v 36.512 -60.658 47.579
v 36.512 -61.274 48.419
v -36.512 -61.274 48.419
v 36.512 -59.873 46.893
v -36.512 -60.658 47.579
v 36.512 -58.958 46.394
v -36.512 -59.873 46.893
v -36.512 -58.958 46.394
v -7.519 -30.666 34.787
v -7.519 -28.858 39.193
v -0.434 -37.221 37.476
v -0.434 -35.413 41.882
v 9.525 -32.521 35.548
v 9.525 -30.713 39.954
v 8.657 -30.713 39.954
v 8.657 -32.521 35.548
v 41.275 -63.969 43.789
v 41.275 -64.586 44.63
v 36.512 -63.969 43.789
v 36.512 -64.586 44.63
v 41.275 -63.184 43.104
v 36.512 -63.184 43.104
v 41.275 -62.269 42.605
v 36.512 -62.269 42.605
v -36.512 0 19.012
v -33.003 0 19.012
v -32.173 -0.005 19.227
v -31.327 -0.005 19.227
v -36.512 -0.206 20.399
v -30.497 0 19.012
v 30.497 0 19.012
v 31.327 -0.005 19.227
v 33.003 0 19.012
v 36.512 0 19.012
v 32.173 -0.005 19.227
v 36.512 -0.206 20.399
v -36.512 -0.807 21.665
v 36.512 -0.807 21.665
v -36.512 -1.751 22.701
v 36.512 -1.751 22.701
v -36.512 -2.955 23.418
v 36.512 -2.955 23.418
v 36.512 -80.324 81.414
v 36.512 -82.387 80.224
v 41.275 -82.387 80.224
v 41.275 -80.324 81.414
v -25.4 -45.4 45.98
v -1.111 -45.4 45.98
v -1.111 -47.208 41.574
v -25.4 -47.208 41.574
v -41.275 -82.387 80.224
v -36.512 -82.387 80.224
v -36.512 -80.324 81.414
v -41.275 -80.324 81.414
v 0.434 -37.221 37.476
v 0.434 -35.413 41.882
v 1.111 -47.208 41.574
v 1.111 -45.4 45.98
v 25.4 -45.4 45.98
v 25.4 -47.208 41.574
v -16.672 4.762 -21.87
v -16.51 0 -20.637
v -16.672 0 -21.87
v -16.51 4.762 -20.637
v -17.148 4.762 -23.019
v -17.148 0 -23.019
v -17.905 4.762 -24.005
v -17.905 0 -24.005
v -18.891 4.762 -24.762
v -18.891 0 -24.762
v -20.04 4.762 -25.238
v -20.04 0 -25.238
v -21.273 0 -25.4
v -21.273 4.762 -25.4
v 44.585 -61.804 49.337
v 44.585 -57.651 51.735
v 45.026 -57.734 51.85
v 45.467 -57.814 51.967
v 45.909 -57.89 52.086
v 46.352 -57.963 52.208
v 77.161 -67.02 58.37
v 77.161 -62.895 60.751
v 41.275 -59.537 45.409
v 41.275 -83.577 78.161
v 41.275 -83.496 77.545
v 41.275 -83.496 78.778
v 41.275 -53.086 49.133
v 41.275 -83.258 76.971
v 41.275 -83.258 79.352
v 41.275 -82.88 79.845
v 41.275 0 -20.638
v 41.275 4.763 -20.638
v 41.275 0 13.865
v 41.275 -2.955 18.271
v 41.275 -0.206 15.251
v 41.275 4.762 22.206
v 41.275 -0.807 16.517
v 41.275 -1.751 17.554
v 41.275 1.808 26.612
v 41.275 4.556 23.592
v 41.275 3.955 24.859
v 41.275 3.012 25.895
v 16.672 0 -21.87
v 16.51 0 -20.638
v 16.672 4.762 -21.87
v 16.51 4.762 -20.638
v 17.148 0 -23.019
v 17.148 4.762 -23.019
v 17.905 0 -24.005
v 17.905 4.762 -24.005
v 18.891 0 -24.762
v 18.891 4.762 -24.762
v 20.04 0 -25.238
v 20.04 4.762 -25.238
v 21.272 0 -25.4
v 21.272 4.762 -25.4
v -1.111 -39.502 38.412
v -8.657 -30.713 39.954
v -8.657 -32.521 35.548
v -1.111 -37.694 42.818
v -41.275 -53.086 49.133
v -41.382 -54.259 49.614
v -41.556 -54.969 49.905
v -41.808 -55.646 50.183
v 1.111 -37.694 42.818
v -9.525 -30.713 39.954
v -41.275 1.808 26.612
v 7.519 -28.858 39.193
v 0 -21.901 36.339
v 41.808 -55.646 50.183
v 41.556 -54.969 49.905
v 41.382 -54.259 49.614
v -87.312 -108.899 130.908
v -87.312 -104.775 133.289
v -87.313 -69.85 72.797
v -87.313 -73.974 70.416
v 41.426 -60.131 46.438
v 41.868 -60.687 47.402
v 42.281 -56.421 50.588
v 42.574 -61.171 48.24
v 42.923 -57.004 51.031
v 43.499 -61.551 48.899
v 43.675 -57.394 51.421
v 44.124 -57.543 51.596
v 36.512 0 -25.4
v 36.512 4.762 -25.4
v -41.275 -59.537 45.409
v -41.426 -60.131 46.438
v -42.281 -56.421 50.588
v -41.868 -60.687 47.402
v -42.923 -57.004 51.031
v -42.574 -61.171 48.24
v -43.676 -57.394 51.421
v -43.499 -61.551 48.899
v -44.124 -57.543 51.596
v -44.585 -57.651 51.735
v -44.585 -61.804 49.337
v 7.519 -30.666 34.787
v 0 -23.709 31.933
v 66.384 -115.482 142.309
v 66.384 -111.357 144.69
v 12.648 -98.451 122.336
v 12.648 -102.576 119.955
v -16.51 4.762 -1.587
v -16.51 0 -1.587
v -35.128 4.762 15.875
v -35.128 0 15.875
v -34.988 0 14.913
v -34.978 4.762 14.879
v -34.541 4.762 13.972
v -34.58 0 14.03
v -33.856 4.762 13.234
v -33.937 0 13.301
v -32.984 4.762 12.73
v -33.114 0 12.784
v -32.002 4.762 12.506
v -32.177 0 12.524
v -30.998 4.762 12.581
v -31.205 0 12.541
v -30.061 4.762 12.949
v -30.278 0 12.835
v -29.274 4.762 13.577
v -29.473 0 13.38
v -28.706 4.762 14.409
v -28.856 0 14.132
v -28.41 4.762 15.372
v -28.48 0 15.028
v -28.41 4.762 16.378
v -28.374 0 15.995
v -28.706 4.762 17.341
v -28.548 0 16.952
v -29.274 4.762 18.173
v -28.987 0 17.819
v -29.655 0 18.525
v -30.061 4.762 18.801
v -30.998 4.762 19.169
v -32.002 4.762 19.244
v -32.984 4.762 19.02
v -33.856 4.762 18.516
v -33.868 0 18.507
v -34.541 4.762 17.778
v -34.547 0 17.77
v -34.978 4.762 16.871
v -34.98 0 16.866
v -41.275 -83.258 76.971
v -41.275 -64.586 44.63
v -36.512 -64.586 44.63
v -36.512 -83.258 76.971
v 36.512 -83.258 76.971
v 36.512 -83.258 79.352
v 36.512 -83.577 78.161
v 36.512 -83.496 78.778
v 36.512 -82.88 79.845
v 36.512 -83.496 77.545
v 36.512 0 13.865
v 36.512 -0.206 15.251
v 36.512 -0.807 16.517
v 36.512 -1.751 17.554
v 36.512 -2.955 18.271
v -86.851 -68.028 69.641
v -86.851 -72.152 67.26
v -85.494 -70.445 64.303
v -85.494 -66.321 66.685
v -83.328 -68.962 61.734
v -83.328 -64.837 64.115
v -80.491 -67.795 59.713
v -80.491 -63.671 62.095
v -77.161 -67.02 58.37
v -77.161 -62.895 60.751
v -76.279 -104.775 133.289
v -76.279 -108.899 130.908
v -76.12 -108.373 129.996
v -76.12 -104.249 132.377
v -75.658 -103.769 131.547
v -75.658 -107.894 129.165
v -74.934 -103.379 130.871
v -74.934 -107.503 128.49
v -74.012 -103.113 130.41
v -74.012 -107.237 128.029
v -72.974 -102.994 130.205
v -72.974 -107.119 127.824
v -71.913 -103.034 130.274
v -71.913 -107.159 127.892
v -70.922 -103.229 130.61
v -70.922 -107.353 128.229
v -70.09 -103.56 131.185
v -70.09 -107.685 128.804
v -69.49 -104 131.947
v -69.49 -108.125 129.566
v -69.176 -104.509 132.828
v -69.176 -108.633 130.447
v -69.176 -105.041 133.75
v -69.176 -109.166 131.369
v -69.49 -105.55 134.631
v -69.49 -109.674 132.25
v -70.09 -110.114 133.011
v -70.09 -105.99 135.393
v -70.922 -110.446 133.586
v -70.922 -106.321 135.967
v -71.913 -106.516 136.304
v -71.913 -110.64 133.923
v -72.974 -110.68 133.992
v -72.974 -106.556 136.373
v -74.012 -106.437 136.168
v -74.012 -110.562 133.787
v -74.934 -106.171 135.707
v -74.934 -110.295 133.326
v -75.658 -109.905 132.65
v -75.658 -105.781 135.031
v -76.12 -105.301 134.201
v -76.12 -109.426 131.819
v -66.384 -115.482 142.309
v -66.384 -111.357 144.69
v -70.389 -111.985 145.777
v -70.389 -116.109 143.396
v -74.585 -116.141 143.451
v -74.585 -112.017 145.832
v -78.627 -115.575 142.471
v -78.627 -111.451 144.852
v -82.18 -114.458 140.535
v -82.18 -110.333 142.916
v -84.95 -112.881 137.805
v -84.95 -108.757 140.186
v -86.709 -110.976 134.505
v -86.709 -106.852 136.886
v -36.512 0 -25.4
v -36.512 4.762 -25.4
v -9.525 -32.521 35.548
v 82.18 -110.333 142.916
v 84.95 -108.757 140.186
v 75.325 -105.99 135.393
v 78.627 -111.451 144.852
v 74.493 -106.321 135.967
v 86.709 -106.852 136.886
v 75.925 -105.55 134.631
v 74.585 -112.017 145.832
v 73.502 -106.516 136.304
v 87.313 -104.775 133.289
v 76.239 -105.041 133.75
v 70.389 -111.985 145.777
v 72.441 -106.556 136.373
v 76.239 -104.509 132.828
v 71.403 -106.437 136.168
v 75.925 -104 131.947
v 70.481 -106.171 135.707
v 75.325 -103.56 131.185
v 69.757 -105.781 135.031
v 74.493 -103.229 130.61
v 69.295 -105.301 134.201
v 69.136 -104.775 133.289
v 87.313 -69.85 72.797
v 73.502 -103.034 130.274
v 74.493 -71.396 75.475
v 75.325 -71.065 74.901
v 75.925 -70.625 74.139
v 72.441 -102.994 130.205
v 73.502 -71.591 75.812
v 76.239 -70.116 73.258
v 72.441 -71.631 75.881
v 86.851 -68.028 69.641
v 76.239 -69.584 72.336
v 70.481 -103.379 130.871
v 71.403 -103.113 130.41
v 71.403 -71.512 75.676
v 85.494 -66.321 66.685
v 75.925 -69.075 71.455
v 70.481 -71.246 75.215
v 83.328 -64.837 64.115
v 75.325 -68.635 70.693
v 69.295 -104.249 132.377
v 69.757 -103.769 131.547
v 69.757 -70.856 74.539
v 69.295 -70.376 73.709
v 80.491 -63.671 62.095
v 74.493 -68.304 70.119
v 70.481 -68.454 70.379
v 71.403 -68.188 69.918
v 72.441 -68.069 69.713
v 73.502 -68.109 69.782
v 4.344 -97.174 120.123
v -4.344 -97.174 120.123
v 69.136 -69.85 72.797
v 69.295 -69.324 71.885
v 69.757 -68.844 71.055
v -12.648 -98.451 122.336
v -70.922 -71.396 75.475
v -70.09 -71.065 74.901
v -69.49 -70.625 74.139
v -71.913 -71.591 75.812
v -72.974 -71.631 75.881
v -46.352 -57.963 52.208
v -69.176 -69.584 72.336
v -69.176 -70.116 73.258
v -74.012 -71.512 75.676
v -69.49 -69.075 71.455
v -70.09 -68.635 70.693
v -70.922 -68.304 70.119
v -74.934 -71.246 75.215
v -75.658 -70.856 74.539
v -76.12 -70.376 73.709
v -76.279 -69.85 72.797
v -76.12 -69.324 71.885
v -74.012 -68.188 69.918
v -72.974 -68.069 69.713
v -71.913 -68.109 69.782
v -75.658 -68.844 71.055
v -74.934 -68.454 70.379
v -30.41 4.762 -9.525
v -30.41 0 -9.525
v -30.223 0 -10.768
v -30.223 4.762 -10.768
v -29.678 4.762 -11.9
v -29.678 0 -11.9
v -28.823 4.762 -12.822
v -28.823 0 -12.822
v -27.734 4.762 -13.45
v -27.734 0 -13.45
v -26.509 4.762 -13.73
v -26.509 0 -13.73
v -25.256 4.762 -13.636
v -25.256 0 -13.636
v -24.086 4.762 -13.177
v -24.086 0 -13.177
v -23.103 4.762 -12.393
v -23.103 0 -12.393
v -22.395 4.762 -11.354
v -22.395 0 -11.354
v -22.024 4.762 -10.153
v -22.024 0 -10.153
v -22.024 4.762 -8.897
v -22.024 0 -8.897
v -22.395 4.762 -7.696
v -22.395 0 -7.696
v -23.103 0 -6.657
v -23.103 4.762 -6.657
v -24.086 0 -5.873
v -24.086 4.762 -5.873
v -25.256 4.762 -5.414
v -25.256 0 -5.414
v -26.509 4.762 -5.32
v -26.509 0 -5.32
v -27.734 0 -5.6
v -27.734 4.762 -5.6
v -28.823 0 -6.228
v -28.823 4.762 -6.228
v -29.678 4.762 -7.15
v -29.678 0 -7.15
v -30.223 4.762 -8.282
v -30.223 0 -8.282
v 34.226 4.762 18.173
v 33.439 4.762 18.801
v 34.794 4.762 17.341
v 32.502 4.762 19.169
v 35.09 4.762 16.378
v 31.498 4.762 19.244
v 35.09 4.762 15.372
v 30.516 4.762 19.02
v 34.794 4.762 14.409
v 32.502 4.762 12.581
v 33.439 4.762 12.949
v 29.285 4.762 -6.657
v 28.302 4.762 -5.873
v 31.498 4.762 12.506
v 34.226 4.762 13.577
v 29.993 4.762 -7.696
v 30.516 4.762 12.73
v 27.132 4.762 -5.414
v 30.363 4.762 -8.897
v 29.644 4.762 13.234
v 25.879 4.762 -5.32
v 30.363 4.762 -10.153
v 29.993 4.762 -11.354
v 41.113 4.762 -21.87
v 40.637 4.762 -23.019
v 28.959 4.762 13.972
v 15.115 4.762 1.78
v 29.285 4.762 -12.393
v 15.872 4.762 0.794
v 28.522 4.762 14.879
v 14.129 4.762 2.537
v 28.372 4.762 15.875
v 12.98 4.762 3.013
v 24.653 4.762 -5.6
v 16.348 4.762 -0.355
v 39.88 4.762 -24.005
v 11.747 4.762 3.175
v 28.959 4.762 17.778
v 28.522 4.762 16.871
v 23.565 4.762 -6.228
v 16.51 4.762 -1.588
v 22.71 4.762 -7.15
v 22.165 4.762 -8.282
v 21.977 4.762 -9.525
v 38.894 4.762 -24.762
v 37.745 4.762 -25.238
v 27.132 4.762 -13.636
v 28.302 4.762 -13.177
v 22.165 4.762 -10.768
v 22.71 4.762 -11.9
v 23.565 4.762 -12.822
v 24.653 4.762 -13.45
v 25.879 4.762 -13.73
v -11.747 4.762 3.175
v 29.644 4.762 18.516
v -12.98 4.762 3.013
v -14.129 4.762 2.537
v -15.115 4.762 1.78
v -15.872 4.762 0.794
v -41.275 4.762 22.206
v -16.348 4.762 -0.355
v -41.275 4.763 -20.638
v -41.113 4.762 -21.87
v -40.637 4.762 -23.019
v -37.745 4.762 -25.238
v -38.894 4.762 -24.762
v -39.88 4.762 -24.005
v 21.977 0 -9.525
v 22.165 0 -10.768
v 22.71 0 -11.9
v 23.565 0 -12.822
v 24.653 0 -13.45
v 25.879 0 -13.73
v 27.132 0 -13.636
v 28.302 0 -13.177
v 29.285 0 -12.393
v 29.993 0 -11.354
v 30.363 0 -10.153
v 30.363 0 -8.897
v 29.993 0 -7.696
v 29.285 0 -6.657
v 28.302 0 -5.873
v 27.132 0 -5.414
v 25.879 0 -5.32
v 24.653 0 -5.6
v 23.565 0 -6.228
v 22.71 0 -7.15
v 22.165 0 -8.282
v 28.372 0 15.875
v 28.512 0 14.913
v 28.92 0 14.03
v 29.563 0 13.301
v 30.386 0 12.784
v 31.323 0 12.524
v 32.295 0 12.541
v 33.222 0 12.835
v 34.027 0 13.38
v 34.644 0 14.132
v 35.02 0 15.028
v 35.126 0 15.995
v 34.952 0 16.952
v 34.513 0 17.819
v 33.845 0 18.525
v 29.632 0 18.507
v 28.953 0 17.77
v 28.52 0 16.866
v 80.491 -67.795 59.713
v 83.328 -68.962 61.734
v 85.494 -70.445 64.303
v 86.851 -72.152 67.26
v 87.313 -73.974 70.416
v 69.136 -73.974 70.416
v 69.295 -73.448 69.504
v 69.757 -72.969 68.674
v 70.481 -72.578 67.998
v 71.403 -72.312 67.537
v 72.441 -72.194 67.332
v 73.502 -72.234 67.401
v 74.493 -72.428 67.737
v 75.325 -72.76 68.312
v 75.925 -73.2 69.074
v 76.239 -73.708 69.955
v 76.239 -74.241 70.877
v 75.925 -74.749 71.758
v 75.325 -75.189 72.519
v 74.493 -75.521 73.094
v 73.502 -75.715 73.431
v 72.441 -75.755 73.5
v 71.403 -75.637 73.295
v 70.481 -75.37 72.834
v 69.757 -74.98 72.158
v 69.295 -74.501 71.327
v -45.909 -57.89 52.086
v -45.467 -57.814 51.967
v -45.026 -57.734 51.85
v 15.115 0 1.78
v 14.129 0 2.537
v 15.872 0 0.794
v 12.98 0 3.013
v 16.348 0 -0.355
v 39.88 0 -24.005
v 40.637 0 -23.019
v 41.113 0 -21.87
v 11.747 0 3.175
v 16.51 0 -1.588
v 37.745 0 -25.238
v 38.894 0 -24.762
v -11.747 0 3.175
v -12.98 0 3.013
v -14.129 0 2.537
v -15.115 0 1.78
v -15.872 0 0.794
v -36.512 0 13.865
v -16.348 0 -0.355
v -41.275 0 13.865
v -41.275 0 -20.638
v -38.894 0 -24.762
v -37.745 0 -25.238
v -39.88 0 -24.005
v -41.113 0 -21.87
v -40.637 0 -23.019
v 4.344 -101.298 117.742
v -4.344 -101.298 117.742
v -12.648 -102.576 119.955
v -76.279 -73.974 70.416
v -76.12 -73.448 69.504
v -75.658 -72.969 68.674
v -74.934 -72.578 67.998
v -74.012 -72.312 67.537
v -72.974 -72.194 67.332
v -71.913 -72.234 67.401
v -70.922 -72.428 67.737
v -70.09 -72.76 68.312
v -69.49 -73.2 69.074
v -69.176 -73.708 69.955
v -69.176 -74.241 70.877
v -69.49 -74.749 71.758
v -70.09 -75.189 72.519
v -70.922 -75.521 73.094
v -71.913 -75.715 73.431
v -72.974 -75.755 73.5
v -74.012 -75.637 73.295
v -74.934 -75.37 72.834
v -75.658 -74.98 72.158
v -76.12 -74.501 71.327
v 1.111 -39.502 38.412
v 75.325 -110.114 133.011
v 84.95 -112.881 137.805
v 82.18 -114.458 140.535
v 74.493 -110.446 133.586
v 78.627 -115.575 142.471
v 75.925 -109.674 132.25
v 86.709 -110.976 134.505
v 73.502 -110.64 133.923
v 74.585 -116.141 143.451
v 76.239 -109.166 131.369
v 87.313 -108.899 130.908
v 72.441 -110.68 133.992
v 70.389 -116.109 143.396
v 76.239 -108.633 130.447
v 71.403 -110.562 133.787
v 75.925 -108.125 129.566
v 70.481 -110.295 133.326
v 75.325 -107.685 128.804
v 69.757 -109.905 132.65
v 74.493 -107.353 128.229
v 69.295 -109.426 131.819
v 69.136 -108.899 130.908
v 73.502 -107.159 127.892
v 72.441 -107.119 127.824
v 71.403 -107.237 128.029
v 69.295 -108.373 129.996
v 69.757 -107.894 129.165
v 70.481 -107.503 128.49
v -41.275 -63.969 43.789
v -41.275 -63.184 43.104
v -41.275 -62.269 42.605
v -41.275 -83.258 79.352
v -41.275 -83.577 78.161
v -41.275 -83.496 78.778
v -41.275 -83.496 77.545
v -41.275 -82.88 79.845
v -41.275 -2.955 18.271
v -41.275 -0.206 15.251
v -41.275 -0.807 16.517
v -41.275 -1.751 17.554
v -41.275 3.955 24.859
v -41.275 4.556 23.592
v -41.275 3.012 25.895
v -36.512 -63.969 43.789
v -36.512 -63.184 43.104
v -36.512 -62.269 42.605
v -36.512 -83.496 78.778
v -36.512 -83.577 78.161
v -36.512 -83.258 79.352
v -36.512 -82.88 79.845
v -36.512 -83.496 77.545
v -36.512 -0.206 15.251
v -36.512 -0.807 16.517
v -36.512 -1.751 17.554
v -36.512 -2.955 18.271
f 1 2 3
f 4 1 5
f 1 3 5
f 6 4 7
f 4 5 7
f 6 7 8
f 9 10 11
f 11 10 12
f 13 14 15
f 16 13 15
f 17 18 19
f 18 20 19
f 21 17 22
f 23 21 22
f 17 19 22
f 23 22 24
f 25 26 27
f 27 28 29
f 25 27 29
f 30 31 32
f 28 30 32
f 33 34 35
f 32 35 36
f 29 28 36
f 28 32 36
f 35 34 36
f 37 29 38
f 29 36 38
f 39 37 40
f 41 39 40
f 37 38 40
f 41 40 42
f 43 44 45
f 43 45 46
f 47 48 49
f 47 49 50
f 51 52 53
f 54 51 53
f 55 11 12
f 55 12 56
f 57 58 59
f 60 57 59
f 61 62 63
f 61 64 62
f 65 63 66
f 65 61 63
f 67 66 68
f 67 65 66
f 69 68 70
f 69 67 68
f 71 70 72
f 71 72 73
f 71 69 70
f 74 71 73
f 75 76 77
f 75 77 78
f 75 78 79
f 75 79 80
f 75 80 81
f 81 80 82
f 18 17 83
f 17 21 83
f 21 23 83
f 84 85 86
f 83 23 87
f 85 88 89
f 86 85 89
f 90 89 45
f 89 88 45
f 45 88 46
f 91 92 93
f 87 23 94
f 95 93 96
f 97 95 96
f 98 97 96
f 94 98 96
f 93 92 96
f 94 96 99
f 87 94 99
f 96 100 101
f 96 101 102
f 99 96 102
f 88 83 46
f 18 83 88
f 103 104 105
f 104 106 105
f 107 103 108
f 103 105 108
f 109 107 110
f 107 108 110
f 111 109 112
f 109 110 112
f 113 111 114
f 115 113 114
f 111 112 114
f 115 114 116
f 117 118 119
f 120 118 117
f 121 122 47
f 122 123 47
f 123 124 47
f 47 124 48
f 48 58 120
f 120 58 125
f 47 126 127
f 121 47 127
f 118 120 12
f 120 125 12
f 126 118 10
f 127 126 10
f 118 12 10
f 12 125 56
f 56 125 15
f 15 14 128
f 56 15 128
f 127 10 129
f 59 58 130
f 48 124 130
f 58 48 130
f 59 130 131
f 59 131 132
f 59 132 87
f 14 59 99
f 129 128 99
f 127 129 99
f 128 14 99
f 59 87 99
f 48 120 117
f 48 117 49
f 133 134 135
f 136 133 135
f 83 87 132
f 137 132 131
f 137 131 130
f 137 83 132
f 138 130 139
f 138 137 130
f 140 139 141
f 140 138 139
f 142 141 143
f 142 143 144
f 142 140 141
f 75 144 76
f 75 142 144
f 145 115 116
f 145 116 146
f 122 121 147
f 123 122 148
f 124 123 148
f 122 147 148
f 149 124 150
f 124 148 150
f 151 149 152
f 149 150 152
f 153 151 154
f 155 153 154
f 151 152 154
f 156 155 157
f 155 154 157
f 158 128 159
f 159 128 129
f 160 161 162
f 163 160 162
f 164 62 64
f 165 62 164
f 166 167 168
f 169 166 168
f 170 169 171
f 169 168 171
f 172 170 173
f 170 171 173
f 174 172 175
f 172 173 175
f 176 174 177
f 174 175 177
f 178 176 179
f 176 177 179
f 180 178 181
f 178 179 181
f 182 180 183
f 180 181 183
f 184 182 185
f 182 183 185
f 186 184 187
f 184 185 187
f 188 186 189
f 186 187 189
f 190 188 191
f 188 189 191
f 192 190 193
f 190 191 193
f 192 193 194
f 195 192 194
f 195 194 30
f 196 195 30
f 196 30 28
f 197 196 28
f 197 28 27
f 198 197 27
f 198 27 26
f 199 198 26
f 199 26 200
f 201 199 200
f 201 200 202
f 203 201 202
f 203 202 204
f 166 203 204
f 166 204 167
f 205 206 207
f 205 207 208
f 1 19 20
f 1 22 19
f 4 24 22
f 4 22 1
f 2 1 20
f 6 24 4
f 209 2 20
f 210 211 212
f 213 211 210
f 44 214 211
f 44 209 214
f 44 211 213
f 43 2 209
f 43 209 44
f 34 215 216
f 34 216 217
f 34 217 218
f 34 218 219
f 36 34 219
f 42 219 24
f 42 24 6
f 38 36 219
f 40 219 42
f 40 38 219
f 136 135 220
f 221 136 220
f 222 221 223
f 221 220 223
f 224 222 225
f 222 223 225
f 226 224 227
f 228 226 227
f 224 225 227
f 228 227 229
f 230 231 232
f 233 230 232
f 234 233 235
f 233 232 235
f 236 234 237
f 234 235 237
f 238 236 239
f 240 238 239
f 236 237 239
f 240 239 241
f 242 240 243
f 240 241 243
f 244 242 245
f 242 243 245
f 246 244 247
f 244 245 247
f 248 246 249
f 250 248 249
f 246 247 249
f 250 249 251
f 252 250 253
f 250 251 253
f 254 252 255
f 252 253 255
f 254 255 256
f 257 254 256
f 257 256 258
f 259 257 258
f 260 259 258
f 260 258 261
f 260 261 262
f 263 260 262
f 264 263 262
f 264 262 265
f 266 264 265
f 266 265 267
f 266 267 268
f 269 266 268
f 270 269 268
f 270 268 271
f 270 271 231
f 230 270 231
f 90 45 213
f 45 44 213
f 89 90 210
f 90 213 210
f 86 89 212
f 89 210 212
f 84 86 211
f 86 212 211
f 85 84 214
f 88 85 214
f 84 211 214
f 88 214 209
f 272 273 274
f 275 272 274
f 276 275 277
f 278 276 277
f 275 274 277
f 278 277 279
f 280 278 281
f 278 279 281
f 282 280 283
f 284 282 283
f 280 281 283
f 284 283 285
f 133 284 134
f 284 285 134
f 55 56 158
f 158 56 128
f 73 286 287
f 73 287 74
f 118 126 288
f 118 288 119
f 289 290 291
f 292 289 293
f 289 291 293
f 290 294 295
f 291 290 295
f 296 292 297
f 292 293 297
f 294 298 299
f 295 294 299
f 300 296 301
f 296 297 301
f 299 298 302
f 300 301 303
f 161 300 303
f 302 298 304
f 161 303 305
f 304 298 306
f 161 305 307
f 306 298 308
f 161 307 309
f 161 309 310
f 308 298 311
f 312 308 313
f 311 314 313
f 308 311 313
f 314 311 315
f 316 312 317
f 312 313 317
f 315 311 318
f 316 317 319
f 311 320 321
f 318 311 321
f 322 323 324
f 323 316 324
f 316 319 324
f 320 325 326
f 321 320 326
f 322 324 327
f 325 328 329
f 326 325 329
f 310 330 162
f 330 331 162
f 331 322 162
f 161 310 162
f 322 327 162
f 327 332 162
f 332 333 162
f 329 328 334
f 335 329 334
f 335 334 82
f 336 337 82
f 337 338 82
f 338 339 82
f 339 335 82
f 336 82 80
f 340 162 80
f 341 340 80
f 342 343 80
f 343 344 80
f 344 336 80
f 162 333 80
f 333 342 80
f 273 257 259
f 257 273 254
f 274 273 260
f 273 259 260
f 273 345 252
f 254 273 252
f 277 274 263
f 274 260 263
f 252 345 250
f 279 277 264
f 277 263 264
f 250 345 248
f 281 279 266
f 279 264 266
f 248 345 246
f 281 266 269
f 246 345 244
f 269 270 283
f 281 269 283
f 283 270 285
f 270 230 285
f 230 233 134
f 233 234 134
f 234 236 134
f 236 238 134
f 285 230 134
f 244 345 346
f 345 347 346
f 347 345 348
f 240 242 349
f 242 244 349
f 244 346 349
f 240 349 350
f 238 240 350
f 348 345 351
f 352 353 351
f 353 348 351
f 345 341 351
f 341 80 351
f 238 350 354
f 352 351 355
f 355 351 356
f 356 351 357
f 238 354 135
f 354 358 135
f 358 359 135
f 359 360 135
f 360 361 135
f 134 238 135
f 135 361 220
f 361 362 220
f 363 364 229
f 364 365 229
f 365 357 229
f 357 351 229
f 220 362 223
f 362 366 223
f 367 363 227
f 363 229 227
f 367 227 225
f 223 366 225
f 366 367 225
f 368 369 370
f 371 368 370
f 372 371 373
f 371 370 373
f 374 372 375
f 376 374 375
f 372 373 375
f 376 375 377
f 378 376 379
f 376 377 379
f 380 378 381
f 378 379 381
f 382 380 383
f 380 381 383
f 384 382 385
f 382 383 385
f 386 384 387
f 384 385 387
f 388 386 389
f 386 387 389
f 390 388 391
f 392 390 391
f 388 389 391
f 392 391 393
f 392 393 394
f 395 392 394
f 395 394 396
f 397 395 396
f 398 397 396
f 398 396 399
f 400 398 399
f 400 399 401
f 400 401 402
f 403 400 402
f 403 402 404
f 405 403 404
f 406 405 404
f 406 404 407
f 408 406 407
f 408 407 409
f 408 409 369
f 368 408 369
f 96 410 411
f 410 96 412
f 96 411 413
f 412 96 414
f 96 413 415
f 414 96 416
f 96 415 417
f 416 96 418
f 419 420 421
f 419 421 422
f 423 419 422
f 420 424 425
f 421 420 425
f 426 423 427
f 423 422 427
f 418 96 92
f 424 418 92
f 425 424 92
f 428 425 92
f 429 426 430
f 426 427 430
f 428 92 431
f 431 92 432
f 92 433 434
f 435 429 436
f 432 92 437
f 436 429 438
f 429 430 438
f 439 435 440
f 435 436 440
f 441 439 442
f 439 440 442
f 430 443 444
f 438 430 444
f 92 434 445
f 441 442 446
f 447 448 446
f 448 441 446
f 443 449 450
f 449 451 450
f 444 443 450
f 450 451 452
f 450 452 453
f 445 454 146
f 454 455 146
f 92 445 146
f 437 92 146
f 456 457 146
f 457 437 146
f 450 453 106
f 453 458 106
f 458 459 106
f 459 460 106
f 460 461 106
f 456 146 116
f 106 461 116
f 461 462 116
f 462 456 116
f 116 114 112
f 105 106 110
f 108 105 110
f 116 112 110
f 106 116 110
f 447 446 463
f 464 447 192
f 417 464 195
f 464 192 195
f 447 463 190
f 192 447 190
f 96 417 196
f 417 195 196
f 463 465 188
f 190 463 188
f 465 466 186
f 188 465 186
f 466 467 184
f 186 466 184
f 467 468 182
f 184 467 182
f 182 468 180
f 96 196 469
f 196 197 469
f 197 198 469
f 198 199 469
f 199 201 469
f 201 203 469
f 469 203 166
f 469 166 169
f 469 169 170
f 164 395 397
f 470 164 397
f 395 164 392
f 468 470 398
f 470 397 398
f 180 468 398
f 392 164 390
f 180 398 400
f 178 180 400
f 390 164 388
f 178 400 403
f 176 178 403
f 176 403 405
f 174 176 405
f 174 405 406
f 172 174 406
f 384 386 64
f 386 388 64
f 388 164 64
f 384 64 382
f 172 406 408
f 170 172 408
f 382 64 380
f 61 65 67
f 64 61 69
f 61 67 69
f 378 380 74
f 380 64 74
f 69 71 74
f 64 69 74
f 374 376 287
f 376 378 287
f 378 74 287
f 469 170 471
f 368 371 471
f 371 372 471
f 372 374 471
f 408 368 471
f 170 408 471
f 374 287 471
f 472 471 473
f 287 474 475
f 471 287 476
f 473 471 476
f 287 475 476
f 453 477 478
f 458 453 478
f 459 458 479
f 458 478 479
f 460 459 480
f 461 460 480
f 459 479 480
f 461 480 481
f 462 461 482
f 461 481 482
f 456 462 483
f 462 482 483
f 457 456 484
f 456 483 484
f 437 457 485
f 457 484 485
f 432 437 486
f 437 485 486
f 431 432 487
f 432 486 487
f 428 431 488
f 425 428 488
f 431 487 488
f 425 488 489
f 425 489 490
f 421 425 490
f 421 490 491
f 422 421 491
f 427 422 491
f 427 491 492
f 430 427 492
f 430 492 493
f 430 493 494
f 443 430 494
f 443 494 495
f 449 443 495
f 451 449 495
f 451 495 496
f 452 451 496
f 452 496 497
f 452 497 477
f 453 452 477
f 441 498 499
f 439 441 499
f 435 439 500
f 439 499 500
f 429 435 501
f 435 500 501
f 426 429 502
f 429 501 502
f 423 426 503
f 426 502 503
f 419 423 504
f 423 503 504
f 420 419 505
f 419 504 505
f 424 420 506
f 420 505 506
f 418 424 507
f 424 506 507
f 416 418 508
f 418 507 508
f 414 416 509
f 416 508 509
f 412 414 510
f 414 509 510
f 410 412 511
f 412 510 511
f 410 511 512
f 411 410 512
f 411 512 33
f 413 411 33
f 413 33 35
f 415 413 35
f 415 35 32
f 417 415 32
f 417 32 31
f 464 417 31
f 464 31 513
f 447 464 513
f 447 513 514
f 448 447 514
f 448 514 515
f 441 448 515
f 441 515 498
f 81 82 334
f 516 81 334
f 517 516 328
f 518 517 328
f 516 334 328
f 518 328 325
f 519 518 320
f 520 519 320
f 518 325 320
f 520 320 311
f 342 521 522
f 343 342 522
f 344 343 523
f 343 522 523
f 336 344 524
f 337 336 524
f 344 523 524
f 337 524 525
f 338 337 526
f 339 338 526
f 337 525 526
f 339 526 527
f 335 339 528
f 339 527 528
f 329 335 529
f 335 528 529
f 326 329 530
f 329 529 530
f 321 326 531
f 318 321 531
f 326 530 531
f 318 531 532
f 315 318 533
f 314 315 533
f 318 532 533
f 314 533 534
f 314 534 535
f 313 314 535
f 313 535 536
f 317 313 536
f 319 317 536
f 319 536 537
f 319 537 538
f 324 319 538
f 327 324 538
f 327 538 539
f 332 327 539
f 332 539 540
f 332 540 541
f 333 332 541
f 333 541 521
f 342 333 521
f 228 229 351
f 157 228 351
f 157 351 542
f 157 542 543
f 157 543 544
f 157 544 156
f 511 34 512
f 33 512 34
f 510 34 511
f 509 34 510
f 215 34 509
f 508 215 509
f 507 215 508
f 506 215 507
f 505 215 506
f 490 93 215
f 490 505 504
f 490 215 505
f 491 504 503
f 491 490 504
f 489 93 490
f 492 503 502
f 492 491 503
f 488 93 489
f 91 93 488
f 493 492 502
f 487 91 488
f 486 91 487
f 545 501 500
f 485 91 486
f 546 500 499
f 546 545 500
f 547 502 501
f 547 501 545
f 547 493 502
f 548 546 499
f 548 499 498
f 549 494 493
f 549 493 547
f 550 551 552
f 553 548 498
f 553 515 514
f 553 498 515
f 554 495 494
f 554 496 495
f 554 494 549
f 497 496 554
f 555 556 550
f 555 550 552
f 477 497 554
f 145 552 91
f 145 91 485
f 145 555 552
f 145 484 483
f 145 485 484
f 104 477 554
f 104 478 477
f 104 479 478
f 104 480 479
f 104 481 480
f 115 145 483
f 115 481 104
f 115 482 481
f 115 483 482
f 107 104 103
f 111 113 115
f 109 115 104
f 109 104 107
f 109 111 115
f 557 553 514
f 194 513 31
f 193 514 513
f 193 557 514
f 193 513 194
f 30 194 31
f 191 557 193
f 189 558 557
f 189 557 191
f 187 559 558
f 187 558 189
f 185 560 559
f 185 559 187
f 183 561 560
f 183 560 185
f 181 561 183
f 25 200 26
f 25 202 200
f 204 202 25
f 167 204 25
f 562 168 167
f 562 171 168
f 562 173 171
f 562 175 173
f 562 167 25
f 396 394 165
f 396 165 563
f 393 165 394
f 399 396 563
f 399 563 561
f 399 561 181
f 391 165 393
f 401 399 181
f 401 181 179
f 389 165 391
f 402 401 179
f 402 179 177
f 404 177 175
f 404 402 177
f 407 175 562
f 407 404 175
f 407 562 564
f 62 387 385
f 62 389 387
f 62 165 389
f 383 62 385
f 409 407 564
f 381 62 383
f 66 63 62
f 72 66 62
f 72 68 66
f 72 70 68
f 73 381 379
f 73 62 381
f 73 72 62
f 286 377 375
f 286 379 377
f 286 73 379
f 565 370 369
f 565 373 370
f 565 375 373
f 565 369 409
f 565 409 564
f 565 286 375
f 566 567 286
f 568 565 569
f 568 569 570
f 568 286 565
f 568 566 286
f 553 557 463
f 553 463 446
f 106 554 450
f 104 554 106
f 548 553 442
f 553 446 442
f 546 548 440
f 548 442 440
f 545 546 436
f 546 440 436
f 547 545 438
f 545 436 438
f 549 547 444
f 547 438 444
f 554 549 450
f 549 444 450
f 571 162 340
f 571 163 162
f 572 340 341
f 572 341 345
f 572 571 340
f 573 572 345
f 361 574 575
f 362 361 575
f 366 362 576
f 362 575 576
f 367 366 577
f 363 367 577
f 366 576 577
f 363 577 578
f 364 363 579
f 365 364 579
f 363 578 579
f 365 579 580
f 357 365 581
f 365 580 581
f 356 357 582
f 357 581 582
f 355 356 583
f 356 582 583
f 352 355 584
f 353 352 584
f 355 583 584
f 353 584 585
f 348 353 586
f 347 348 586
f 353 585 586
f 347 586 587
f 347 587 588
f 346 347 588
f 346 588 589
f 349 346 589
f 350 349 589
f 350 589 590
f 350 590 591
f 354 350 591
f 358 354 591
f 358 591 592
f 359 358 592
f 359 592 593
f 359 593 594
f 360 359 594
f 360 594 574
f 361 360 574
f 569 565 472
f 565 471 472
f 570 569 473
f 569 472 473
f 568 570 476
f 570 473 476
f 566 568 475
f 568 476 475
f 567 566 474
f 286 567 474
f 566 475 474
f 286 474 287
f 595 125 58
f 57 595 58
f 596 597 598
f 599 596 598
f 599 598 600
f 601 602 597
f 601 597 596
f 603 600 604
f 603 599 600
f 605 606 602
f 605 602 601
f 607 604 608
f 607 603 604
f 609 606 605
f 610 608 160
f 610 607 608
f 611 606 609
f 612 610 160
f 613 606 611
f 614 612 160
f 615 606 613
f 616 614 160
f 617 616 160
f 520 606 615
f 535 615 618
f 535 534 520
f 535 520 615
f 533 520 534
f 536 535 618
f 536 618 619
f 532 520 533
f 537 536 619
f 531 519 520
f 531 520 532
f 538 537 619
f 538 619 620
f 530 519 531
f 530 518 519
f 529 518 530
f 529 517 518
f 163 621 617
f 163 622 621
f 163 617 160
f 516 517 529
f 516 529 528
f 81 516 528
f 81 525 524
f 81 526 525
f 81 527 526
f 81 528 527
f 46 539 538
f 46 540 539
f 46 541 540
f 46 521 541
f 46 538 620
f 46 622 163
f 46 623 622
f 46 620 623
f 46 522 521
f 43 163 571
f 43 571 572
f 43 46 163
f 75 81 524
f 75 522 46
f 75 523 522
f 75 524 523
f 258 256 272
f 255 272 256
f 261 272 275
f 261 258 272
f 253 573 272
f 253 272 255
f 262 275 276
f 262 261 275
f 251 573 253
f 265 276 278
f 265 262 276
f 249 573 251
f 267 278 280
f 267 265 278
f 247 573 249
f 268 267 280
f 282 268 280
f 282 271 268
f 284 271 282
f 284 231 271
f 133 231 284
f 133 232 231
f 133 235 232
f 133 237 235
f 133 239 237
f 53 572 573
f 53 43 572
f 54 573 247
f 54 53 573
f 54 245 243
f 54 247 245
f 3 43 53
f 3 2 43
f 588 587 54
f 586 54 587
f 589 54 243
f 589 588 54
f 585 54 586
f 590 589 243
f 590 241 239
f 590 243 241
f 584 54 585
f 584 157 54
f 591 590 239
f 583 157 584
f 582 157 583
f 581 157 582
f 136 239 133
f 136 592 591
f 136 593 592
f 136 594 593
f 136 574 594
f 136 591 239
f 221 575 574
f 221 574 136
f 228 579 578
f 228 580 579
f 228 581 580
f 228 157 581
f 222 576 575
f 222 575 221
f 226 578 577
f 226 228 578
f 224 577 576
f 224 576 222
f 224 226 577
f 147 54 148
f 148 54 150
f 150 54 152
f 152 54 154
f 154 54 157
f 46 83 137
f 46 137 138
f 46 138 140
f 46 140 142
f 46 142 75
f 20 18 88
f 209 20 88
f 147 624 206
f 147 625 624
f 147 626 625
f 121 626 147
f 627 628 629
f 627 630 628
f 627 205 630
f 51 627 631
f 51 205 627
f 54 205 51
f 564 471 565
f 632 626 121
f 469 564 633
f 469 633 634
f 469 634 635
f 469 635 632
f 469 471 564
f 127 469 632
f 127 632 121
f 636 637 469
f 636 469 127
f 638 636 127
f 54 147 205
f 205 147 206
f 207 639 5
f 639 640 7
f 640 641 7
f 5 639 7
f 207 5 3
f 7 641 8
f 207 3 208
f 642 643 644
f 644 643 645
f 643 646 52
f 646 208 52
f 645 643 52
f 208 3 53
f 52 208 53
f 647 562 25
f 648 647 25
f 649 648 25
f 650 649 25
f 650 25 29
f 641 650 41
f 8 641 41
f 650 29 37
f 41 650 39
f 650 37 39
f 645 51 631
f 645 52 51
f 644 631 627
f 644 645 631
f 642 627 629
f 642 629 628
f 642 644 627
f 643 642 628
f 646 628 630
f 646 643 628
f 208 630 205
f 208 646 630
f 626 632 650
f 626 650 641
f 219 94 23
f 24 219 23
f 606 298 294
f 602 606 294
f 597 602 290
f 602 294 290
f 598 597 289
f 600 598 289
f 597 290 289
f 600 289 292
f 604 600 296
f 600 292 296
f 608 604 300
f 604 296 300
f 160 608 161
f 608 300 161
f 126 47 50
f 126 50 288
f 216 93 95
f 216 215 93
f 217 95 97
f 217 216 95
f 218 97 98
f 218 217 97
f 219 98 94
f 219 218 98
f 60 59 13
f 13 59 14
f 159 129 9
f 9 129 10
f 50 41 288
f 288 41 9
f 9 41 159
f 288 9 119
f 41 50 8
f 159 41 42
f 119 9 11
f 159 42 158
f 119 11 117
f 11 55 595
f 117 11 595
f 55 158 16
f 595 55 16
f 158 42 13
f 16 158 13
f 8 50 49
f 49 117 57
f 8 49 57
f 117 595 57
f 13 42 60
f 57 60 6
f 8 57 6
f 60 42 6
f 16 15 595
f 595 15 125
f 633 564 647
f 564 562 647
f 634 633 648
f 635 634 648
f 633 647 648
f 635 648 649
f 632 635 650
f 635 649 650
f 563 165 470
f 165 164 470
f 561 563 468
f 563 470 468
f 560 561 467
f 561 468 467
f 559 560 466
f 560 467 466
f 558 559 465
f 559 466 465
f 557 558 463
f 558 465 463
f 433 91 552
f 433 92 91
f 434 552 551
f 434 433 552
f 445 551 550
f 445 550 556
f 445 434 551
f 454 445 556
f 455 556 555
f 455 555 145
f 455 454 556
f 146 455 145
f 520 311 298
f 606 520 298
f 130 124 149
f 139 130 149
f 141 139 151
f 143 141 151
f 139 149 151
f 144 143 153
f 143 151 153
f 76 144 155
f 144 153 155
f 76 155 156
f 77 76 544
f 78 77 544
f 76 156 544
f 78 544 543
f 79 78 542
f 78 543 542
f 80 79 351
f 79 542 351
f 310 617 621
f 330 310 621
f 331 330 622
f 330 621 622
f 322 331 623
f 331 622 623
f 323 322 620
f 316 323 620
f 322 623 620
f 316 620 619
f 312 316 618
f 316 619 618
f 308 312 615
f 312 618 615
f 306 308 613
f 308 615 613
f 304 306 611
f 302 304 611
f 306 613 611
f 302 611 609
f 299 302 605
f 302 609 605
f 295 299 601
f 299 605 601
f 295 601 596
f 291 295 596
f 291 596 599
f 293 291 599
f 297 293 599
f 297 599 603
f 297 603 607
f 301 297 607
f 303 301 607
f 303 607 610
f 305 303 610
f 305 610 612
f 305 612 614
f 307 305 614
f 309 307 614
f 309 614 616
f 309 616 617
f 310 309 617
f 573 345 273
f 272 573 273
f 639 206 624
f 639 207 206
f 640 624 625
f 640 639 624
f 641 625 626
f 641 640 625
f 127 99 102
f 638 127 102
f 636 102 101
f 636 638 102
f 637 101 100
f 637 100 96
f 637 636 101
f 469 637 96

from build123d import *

# Parameters (mm, degrees)
BOSS_EXTRUDE1_DEPTH      = 4.7625
BOSS_EXTRUDE2_DEPTH      = 41.275
BOSS_EXTRUDE4_START      = 41.275
BOSS_EXTRUDE4_DEPTH      = 4.7625
BOSS_EXTRUDE5_START      = -41.275
BOSS_EXTRUDE5_DEPTH      = 4.7625
BOSS_EXTRUDE3_DEPTH      = 4.7625
CUT_EXTRUDE1_DEPTH       = 197.1201289744139
FILLET3_R                = 4.7625
FILLET5_R                = 29.209999999999997
F_1_4_CLEARANCE_HOLE1_D  = 6.7564
F_5_16_CLEARANCE_HOLE1_D = 8.4328
F_1_4_CLEARANCE_HOLE2_D  = 7.14248
FILLET6_R                = 2.3812499999999996


with BuildPart() as part:
    # Sketch1 → Boss-Extrude1 (new body)
    with BuildSketch(Plane(origin=(0, 0, 0), x_dir=(1, 0, 0), z_dir=(0, 1, 0))):
        Polygon((41.275, -25.39999999999999), (-41.275, -25.400000000000002), (-41.275, 25.4), (-16.510000000000005, 25.4), (-16.509999999999998, -3.1750000000000003), (16.509999999999998, -3.1749999999999963), (16.509999999999998, 25.400000000000002), (41.275, 25.400000000000006), align=None)
    extrude(amount=BOSS_EXTRUDE1_DEPTH)

    # Sketch6 → Boss-Extrude2 (add, symmetric)
    with BuildSketch(Plane(origin=(0, 0, 0), x_dir=(0, 0, -1), z_dir=(1, 0, 0))):
        Polygon((-22.20613588199718, 0), (-47.01090584437518, -60.46162678329637), (-59.41727262806233, -67.62444598552347), (-61.79852262806233, -63.50000000000006), (-50.8, -57.15), (-25.39999999999999, 4.7625), (-25.39999999999999, 0), align=None)
    extrude(amount=BOSS_EXTRUDE2_DEPTH, both=True)

    # Sketch10 → Boss-Extrude4 (add)
    with BuildSketch(Plane(origin=(0, 0, 0), x_dir=(0, 0, -1), z_dir=(1, 0, 0)).offset(BOSS_EXTRUDE4_START)):
        Polygon((-17.05842561014821, 0), (-43.22181168875039, -63.77325356659284), (-79.03306788418706, -84.44889197104685), (-81.41431788418706, -80.32444598552347), (-47.01090584437518, -60.46162678329637), (-22.20613588199718, 0), align=None)
    extrude(amount=-BOSS_EXTRUDE4_DEPTH)

    # Sketch10<2> → Boss-Extrude5 (add)
    with BuildSketch(Plane(origin=(0, 0, 0), x_dir=(0, 0, -1), z_dir=(1, 0, 0)).offset(BOSS_EXTRUDE5_START)):
        Polygon((-17.05842561014821, 0), (-43.22181168875039, -63.77325356659284), (-79.03306788418706, -84.44889197104685), (-81.41431788418706, -80.32444598552347), (-47.01090584437518, -60.46162678329637), (-22.20613588199718, 0), align=None)
    extrude(amount=BOSS_EXTRUDE5_DEPTH)

    # Sketch7 → Boss-Extrude3 (add)
    with BuildSketch(Plane(origin=(0, -20.865454743874867, -12.046675913140254), x_dir=(1, 0, 0), z_dir=(0, 0.866025403784436, 0.5000000000000046))):
        with BuildLine():
            Line((-87.3125, -167.81909051224963), (-87.31250000000001, -97.96909051224961))
            ThreePointArc((-87.31250000000001, -97.96909051224961), (-84.50480271700945, -89.35923141913764), (-77.16122665481106, -84.05972877692089))
            Line((-77.16122665481106, -84.05972877692089), (-41.275, -72.5690905122496))
            Line((-41.275, -72.5690905122496), (41.275, -72.5690905122496))
            Line((41.275, -72.5690905122496), (77.16122665481105, -84.0597287769209))
            ThreePointArc((77.16122665481105, -84.0597287769209), (84.50480271700943, -89.35923141913766), (87.31250000000001, -97.96909051224961))
            Line((87.31250000000001, -97.96909051224961), (87.31250000000001, -167.81909051224963))
            ThreePointArc((87.31250000000001, -167.81909051224963), (80.4839803351822, -180.18162983863905), (66.38372511516263, -180.98404004522925))
            Line((66.38372511516263, -180.98404004522925), (0, -149.09666116895025))
            Line((0, -149.09666116895025), (-66.38372511516263, -180.98404004522925))
            ThreePointArc((-66.38372511516263, -180.98404004522925), (-80.48398033518218, -180.18162983863903), (-87.3125, -167.81909051224963))
        make_face()
    extrude(amount=-BOSS_EXTRUDE3_DEPTH)

    # Sketch11 → Cut-Extrude1 (cut, through all)
    with BuildSketch(Plane(origin=(0, 9.605402363534044, 23.413168261114233), x_dir=(1, 0, 0), z_dir=(0, 0.37955635625630607, 0.9251686183747458))):
        Polygon((-25.400000388402205, -59.45484943793708), (-9.52500014565082, -43.57984943793708), (-8.657059559184285, -43.57984943793708), (-1.1112499999999998, -51.12565911250755), (-1.1112499999999998, -59.45484943793708), align=None)
        Polygon((1.1112499999999998, -59.45484943793708), (25.399999611597792, -59.45484943793708), (9.524999854349167, -43.57984943793708), (8.657059789956651, -43.57984943793708), (1.1112499999999998, -51.12565911250755), align=None)
        Polygon((0.4339700458708439, -48.65984943793709), (7.519485019617413, -41.57433457253814), (0, -34.05484943793708), (-7.519485012578843, -41.574334335532285), (-0.43397001852167266, -48.65984943793709), align=None)
    extrude(amount=-CUT_EXTRUDE1_DEPTH, mode=Mode.SUBTRACT)

    # Fillet3
    fillet3_edges = [part.edges().sort_by_distance(p)[0] for p in [
        (-41.275, 2.38125, -25.4),
    ]]
    fillet(fillet3_edges, radius=FILLET3_R)
    fillet3_2_edges = [part.edges().sort_by_distance(p)[0] for p in [
        (-41.275, -59.21222299276168, 49.60937499999998),
    ]]
    fillet(fillet3_2_edges, radius=FILLET3_R)
    fillet3_3_edges = [part.edges().sort_by_distance(p)[0] for p in [
        (-16.510000000000005, 2.38125, -25.4),
    ]]
    fillet(fillet3_3_edges, radius=FILLET3_R)
    fillet3_4_edges = [part.edges().sort_by_distance(p)[0] for p in [
        (-38.89375, 0, 17.05842561014821),
    ]]
    fillet(fillet3_4_edges, radius=FILLET3_R)
    fillet3_5_edges = [part.edges().sort_by_distance(p)[0] for p in [
        (0, 0, 22.20613588199718),
    ]]
    fillet(fillet3_5_edges, radius=FILLET3_R)
    fillet3_6_edges = [part.edges().sort_by_distance(p)[0] for p in [
        (38.89375, 0, 17.05842561014821),
    ]]
    fillet(fillet3_6_edges, radius=FILLET3_R)
    fillet3_7_edges = [part.edges().sort_by_distance(p)[0] for p in [
        (-38.89375, -63.77325356659284, 43.22181168875039),
    ]]
    fillet(fillet3_7_edges, radius=FILLET3_R)
    fillet3_8_edges = [part.edges().sort_by_distance(p)[0] for p in [
        (0, -60.46162678329637, 47.01090584437518),
    ]]
    fillet(fillet3_8_edges, radius=FILLET3_R)
    fillet3_9_edges = [part.edges().sort_by_distance(p)[0] for p in [
        (-0.7533233620346138, -57.15, 50.8),
    ]]
    fillet(fillet3_9_edges, radius=FILLET3_R)
    fillet3_10_edges = [part.edges().sort_by_distance(p)[0] for p in [
        (0, 4.7625, 25.4),
    ]]
    fillet(fillet3_10_edges, radius=FILLET3_R)
    fillet3_11_edges = [part.edges().sort_by_distance(p)[0] for p in [
        (-16.509999999999998, 2.38125, 3.1750000000000003),
    ]]
    fillet(fillet3_11_edges, radius=FILLET3_R)
    fillet3_12_edges = [part.edges().sort_by_distance(p)[0] for p in [
        (16.509999999999998, 2.38125, 3.1749999999999963),
    ]]
    fillet(fillet3_12_edges, radius=FILLET3_R)
    fillet3_13_edges = [part.edges().sort_by_distance(p)[0] for p in [
        (16.509999999999998, 2.38125, -25.400000000000002),
    ]]
    fillet(fillet3_13_edges, radius=FILLET3_R)
    fillet3_14_edges = [part.edges().sort_by_distance(p)[0] for p in [
        (38.89375, -63.77325356659284, 43.22181168875039),
    ]]
    fillet(fillet3_14_edges, radius=FILLET3_R)
    fillet3_15_edges = [part.edges().sort_by_distance(p)[0] for p in [
        (41.275, 2.38125, -25.400000000000006),
    ]]
    fillet(fillet3_15_edges, radius=FILLET3_R)
    fillet3_16_edges = [part.edges().sort_by_distance(p)[0] for p in [
        (41.275, -59.0883646148863, 49.68088466780772),
    ]]
    fillet(fillet3_16_edges, radius=FILLET3_R)

    # Fillet5
    fillet5_edges = [part.edges().sort_by_distance(p)[0] for p in [
        (0, -97.47600832111236, 115.88419527861113),
    ]]
    fillet(fillet5_edges, radius=FILLET5_R)

    # 1/4 Clearance Hole1 (through all)
    with Locations(Plane(origin=(0, 4.7625, 0), x_dir=(1, 0, 0), z_dir=(0, 1, 0))):
        with Locations((-31.75, -15.875), (31.75, -15.875)):
            Hole(F_1_4_CLEARANCE_HOLE1_D / 2)

    # 5/16 Clearance Hole1 (through all)
    with Locations(Plane(origin=(0, 4.7625, 0), x_dir=(1, 0, 0), z_dir=(0, 1, 0))):
        with Locations((-26.19375, 9.525), (26.19375, 9.525)):
            Hole(F_5_16_CLEARANCE_HOLE1_D / 2)

    # 1/4 Clearance Hole2 (through all)
    with Locations(Plane(origin=(0, -20.865454743874867, -12.046675913140254), x_dir=(1, 0, 0), z_dir=(0, 0.866025403784436, 0.5000000000000046))):
        with Locations((-72.7075, -97.969090512), (-72.7075, -167.819090512), (72.7075, -167.819090512), (72.7075, -97.969090512)):
            Hole(F_1_4_CLEARANCE_HOLE2_D / 2)

    # Fillet6
    fillet6_edges = [part.edges().sort_by_distance(p)[0] for p in [
        (38.89375, -84.44889197104685, 79.03306788418706),
        (-38.89375, -84.44889197104685, 79.03306788418706),
    ]]
    fillet(fillet6_edges, radius=FILLET6_R)


solid = part.part
